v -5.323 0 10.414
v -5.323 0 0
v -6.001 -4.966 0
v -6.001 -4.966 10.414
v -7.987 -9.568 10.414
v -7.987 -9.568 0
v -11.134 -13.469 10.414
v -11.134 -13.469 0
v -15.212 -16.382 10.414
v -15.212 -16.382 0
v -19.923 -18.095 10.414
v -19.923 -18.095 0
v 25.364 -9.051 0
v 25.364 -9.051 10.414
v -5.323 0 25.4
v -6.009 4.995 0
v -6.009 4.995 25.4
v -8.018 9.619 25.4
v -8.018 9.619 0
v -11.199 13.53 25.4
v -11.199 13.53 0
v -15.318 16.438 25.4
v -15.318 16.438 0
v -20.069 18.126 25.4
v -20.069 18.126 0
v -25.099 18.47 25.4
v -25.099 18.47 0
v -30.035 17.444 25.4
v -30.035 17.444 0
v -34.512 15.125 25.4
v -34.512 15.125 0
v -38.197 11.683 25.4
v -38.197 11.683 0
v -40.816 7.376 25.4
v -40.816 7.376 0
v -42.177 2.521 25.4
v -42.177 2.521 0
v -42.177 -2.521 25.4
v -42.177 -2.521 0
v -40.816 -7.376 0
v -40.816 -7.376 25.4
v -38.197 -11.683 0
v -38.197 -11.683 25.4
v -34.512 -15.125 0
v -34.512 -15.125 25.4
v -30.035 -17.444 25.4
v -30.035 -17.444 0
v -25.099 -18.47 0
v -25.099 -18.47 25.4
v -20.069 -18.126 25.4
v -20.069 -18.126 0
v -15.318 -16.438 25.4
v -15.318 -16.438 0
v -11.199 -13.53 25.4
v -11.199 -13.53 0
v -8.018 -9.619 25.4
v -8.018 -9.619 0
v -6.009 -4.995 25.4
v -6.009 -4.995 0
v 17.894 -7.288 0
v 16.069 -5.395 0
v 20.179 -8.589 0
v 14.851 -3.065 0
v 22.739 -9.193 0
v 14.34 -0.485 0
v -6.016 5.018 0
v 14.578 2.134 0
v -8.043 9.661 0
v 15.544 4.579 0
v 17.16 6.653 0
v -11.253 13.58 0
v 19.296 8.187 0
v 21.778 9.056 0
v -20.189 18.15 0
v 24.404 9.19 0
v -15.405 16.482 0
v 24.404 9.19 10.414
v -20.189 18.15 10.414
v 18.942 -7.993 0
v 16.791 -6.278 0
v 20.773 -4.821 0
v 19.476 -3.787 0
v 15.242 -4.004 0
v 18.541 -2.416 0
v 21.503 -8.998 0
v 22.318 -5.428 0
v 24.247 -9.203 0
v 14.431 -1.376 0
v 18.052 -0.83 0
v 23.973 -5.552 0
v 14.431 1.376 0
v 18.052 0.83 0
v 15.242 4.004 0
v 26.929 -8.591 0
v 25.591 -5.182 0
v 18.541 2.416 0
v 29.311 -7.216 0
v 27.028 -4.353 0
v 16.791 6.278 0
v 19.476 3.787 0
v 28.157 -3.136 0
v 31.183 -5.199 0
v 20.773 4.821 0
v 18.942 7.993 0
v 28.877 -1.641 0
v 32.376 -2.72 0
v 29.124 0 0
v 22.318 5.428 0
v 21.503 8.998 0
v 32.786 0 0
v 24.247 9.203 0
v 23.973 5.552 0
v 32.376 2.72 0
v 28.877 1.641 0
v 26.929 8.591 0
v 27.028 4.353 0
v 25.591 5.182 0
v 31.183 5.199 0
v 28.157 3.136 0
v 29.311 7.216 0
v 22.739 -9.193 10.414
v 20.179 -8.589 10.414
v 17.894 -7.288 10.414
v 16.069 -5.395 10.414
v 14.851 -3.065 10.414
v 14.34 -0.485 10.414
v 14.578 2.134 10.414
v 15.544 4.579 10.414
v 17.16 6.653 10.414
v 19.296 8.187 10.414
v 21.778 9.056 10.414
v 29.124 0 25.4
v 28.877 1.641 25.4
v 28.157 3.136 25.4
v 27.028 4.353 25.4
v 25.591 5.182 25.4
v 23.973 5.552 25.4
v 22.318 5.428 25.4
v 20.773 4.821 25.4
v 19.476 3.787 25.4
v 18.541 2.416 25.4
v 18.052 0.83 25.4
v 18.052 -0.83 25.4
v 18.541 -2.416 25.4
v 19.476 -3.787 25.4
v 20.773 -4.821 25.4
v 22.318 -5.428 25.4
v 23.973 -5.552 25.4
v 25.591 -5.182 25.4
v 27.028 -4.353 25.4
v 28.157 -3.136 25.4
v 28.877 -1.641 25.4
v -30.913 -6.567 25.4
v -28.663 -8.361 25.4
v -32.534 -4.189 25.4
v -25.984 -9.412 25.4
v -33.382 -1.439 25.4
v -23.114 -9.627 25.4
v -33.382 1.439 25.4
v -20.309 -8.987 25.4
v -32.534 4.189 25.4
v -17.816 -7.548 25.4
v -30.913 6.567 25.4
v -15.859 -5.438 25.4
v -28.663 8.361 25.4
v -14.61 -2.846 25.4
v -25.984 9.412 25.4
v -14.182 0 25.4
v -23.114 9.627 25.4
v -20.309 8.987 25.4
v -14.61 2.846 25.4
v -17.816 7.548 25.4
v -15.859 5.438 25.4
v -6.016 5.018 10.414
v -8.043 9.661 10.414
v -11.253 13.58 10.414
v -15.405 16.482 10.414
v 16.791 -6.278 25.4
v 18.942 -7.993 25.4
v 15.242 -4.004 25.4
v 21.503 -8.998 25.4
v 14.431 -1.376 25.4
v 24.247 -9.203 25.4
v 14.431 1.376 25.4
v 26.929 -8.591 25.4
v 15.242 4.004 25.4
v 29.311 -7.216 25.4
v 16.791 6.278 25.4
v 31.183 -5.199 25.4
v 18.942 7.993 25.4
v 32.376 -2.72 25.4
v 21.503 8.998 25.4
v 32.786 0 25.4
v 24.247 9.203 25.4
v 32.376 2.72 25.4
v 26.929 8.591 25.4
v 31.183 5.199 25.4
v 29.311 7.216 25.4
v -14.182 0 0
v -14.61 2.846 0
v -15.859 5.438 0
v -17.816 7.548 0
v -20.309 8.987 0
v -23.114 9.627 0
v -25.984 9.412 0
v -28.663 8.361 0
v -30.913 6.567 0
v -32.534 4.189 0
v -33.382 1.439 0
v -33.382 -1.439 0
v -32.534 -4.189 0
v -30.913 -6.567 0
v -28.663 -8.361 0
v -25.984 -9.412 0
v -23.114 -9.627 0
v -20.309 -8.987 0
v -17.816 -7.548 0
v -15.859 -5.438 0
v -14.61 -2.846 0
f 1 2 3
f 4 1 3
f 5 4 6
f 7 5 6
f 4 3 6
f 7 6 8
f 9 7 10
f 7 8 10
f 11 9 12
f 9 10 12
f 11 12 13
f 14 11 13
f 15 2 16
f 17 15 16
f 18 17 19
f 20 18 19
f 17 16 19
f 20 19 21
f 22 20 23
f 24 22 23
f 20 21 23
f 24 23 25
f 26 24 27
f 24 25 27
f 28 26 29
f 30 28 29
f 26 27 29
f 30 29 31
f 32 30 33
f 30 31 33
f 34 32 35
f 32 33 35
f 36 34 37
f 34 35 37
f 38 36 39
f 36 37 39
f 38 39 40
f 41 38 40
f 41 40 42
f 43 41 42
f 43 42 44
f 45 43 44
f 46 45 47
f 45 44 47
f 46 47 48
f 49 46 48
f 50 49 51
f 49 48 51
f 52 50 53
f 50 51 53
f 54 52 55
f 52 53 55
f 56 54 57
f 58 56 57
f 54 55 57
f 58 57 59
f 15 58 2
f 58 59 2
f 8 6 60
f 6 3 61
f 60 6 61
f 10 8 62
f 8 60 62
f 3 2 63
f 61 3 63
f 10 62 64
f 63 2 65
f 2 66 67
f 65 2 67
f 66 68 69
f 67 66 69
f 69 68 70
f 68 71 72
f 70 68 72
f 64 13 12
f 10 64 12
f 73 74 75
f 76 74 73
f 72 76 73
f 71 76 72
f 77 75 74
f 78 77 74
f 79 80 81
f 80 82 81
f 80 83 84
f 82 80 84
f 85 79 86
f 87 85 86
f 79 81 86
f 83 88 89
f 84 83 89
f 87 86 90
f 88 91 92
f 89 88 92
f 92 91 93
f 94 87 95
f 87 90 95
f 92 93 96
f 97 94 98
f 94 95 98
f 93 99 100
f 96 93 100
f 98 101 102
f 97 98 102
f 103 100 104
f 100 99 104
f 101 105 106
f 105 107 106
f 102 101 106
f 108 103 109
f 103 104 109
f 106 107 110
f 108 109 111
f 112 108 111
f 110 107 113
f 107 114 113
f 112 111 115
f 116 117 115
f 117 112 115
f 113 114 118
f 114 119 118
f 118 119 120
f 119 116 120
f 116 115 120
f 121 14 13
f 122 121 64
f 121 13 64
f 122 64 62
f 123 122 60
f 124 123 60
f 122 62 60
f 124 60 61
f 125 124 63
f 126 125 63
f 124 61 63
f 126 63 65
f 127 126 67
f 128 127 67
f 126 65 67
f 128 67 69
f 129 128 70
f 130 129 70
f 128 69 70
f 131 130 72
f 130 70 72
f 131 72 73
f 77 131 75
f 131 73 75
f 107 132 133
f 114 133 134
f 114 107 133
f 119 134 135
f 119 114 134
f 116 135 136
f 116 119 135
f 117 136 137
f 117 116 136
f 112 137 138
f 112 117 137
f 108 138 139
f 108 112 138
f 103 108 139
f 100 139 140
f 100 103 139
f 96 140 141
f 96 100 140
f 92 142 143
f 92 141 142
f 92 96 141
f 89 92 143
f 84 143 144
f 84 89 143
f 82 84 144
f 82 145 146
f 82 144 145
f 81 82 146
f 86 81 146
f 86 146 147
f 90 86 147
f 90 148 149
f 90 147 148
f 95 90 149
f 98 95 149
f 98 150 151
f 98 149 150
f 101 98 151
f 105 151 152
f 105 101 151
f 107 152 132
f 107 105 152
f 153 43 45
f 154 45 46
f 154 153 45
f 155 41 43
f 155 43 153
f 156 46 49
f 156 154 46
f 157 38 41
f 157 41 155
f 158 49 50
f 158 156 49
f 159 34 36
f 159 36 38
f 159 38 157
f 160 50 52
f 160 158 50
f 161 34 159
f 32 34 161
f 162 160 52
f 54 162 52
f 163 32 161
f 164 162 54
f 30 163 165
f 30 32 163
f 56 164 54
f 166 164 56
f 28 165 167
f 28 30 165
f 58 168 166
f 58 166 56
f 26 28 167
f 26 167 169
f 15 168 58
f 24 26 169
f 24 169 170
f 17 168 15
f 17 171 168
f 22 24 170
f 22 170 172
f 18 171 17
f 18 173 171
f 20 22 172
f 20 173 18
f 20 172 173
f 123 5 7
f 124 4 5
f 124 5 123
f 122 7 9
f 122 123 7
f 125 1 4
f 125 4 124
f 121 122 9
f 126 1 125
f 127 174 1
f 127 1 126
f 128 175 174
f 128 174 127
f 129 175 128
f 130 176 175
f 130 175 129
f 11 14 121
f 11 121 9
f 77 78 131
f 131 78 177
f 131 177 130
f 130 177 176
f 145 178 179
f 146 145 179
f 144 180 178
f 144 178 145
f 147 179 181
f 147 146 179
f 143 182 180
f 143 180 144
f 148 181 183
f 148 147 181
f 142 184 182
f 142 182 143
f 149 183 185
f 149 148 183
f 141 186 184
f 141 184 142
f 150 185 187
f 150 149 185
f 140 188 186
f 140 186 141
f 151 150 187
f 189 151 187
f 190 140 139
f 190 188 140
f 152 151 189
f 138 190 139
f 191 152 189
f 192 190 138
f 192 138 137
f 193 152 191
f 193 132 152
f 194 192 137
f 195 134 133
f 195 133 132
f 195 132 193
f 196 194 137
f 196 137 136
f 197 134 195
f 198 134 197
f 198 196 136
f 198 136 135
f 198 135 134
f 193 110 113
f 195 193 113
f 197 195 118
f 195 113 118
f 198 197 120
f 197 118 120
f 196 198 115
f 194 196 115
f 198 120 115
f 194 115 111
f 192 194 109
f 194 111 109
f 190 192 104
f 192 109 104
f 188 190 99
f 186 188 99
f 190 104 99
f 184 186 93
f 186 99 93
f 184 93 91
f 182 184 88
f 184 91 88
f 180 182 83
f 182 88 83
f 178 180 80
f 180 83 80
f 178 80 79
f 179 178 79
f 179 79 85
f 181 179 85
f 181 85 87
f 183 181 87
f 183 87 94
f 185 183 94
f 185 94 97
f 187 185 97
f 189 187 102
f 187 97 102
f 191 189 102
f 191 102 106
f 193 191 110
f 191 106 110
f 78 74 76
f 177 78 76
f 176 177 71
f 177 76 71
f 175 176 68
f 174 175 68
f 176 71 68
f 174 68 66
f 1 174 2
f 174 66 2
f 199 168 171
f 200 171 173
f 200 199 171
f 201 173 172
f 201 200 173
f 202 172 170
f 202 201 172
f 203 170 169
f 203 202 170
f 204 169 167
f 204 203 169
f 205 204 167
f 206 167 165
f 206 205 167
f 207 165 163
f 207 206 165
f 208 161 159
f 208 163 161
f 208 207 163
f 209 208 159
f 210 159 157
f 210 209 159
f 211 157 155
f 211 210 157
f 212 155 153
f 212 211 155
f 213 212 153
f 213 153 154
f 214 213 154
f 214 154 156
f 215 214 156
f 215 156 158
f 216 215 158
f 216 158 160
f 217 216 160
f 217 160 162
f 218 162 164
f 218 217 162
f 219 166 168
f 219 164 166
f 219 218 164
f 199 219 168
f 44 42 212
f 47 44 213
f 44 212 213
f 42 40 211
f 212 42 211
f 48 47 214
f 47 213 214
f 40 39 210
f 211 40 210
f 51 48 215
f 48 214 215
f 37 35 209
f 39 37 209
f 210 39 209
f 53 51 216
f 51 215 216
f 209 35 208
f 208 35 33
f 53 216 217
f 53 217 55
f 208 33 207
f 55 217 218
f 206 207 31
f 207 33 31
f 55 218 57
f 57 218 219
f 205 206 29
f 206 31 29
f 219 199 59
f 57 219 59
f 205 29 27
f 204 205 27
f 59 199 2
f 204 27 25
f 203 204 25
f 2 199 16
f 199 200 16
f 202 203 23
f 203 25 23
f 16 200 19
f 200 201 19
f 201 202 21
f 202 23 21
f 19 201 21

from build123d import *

# Parameters (mm, degrees)
F0_R     = 18.513208
F0_R_2   = 9.229277
F3_DEPTH = 25.4
F2_R     = 5.567315
F2_R_2   = 9.654222
F4_DEPTH = 228.6
F5_DEPTH = 10.414


with BuildPart() as f3:
    # F0 (on Top) → F3 (new body)
    with BuildSketch(Plane.XY):
        with Locations((-23.835732, 0)):
            Circle(F0_R)
        with Locations((23.556953, 0)):
            Circle(F0_R_2)
    extrude(amount=F3_DEPTH)

    # F2 (on face) → F4 (cut)
    with BuildSketch(Plane.XY):
        with Locations((23.556953, 0)):
            Circle(F2_R)
        with Locations((-23.835732, 0)):
            Circle(F2_R_2)
    extrude(amount=F4_DEPTH, mode=Mode.SUBTRACT)


with BuildPart() as f5:
    # F1 (on face) → F5 (new body)
    with BuildSketch(Plane.XY):
        with BuildLine():
            ThreePointArc((-5.322523, 0), (-9.427787, -11.625405), (-19.922913, -18.094992))
            Line((-19.922913, -18.094992), (25.364459, -9.050551))
            ThreePointArc((25.364459, -9.050551), (14.340437, -0.485166), (24.404244, 9.190302))
            Line((24.404244, 9.190302), (-20.188738, 18.150436))
            ThreePointArc((-20.188738, 18.150436), (-9.513434, 11.730757), (-5.322523, 0))
        make_face()
    extrude(amount=F5_DEPTH)


solid = Compound([f3.part, f5.part])
